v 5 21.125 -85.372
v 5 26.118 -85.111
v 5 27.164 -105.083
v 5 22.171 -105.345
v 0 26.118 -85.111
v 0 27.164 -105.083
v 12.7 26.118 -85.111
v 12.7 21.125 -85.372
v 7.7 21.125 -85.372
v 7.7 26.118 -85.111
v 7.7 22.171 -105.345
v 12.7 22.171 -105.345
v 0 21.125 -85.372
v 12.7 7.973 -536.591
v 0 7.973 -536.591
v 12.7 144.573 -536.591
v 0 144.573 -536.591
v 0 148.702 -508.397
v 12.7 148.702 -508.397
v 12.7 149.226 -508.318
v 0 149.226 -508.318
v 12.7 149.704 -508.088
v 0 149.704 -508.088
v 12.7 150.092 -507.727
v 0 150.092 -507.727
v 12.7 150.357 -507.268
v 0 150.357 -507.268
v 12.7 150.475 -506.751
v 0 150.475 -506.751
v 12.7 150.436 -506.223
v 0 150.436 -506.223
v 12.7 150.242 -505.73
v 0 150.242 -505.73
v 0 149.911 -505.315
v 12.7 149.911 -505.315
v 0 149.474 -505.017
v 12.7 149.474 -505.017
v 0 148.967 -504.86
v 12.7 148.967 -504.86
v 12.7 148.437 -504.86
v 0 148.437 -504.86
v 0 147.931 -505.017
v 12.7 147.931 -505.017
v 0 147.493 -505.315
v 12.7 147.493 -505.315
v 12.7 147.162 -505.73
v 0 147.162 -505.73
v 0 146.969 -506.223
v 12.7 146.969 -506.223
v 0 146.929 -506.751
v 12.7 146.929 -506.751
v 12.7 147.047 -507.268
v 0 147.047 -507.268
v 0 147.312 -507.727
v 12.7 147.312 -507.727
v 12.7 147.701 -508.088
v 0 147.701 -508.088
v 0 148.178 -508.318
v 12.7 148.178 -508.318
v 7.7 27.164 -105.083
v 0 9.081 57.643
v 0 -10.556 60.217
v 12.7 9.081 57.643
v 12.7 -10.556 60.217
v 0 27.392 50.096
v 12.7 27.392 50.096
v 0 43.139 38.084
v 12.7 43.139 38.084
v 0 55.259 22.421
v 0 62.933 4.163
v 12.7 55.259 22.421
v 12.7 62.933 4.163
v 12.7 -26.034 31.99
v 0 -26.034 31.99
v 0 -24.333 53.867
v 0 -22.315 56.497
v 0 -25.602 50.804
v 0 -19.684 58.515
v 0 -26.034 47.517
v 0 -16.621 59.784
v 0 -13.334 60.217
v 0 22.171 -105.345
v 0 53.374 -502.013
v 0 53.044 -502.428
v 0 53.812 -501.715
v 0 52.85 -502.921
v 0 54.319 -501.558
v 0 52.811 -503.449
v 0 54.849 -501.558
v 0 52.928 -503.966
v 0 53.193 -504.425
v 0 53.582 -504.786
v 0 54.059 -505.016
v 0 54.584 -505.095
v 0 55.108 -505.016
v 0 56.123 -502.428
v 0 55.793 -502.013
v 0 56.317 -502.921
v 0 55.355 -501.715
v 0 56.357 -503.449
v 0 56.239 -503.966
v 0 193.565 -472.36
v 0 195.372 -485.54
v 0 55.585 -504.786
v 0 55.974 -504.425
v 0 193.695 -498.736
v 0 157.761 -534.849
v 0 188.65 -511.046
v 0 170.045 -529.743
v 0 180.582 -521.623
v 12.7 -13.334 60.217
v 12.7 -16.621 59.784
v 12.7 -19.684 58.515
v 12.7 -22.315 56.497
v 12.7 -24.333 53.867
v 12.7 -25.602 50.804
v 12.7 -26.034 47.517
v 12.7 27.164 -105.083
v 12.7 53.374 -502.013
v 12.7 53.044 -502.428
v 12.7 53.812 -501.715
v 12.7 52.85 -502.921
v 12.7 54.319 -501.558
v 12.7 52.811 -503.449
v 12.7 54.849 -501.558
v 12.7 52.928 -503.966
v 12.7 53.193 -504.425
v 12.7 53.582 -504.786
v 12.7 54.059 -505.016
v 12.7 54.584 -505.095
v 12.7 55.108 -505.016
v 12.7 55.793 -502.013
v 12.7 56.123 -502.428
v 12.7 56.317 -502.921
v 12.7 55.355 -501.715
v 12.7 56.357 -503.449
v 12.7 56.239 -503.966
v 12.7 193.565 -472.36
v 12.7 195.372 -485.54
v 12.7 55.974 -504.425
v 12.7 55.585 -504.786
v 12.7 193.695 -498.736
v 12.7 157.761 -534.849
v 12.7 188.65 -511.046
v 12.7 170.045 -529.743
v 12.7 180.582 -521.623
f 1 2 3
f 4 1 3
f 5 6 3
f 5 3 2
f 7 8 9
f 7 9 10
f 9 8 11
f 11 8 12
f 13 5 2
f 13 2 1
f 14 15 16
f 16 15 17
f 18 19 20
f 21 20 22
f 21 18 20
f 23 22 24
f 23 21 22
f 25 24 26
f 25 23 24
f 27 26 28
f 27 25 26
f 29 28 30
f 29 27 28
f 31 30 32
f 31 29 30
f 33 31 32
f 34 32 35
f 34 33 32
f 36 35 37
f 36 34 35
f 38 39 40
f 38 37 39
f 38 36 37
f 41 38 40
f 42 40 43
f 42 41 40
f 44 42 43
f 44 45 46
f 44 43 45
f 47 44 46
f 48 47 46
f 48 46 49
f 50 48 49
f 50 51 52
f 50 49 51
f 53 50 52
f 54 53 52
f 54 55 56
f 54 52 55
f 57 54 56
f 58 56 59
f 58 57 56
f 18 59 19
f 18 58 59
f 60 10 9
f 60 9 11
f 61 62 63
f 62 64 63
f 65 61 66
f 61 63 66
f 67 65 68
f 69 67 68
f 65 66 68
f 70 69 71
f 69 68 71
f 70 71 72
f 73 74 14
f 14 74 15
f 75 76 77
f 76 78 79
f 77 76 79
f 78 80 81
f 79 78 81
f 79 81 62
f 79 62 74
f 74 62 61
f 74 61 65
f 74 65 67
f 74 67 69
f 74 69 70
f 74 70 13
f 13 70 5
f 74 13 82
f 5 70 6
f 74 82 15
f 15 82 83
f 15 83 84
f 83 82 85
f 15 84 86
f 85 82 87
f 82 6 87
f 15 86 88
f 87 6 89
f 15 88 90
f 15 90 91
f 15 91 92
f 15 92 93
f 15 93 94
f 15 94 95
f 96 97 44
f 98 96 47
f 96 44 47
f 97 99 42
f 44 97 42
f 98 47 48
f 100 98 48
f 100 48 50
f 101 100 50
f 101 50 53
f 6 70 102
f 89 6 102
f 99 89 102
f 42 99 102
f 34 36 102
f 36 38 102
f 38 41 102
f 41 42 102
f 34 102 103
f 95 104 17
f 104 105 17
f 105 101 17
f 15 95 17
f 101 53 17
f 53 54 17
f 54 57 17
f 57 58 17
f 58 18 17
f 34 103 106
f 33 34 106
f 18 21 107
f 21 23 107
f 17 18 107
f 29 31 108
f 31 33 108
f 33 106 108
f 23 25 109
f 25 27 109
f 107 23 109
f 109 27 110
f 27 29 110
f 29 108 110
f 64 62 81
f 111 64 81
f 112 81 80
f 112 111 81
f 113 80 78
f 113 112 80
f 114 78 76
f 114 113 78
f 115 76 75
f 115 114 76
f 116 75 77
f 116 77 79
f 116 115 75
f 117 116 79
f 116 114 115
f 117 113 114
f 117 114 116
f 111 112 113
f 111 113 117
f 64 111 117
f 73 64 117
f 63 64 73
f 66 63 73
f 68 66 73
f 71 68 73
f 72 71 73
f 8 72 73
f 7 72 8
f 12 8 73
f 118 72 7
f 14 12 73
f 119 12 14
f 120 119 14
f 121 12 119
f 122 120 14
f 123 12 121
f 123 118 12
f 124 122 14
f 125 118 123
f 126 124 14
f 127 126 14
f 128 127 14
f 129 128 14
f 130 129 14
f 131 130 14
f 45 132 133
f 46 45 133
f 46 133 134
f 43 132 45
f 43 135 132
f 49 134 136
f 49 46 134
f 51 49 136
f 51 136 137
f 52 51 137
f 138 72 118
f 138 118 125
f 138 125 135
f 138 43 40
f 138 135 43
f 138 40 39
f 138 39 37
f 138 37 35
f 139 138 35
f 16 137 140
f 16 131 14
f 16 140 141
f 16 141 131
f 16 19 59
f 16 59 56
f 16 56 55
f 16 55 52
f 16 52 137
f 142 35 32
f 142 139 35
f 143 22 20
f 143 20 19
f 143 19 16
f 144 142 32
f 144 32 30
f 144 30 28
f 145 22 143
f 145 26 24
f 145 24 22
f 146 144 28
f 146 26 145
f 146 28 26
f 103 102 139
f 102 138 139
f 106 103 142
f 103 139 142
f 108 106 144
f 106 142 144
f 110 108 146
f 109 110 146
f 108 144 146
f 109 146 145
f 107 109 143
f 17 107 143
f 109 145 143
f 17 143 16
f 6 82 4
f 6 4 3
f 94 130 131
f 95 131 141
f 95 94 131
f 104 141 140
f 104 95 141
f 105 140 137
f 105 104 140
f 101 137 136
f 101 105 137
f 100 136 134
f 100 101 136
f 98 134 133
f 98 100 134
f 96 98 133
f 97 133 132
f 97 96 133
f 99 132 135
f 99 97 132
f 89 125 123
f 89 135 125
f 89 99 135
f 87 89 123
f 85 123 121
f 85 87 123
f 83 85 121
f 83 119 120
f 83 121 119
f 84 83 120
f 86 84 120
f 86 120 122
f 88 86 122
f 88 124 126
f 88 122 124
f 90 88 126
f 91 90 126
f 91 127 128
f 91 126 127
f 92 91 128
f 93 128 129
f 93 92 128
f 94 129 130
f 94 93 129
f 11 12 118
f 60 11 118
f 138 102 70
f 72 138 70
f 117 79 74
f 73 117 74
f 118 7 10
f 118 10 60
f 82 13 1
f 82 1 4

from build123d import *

# Parameters (mm, degrees)
BOSS_EXTRUDE1_DEPTH = 12.7
FILLET1_R           = 76.2
FILLET2_R           = 50.8
FILLET3_R           = 12.7
SKETCH1_3_R         = 1.778
CUT_EXTRUDE1_DEPTH  = 32.004
SKETCH1_5_R         = 1.778
CUT_EXTRUDE3_DEPTH  = 19.304
SKETCH2_W           = 20
SKETCH2_H           = 5
CUT_EXTRUDE4_DEPTH  = 5
CUT_EXTRUDE5_DEPTH  = 5


with BuildPart() as part:
    # Sketch1 → Boss-Extrude1 (new body)
    with BuildSketch(Plane(origin=(0, 0, 0), x_dir=(0, 0, -1), z_dir=(1, 0, 0))):
        Polygon((-60.216908745, 47.566393508), (-60.216908745, -26.034482759), (-31.989836752, -26.034482759), (536.590579473, 7.973019947), (536.590579473, 211.173019947), align=None)
    extrude(amount=BOSS_EXTRUDE1_DEPTH)

    # Fillet1
    fillet1_edges = [part.edges().sort_by_distance(p)[0] for p in [
        (6.35, 47.566393508, 60.216908745),
    ]]
    fillet(fillet1_edges, radius=FILLET1_R)

    # Fillet2
    fillet2_edges = [part.edges().sort_by_distance(p)[0] for p in [
        (6.35, 211.173019947, -536.590579473),
    ]]
    fillet(fillet2_edges, radius=FILLET2_R)

    # Fillet3
    fillet3_edges = [part.edges().sort_by_distance(p)[0] for p in [
        (6.35, -26.034482759, 60.216908745),
    ]]
    fillet(fillet3_edges, radius=FILLET3_R)

    # Sketch1<3> → Cut-Extrude1 (cut)
    with BuildSketch(Plane(origin=(0, 0, 0), x_dir=(0, 0, -1), z_dir=(1, 0, 0))):
        with Locations((503.316579473, 54.583559733)):
            Circle(SKETCH1_3_R)
    extrude(amount=CUT_EXTRUDE1_DEPTH, mode=Mode.SUBTRACT)

    # Sketch1<5> → Cut-Extrude3 (cut)
    with BuildSketch(Plane(origin=(0, 0, 0), x_dir=(0, 0, -1), z_dir=(1, 0, 0))):
        with Locations((506.618579473, 148.702123969)):
            Circle(SKETCH1_5_R)
    extrude(amount=CUT_EXTRUDE3_DEPTH, mode=Mode.SUBTRACT)

    # Sketch2 → Cut-Extrude4 (cut)
    with BuildSketch(Plane(origin=(12.7, -3.610856195, -1.673147661), x_dir=(0, 0.05233595624294395, -0.9986295347545739), z_dir=(1, 0, 0))):
        with Locations((94.879123185, 22.820976731)):
            Rectangle(SKETCH2_W, SKETCH2_H)
    extrude(amount=-CUT_EXTRUDE4_DEPTH, mode=Mode.SUBTRACT)

    # Sketch3 → Cut-Extrude5 (cut)
    with BuildSketch(Plane.ZY):
        Polygon((-85.110749427, 26.117649094), (-85.372429208, 21.12450142), (-105.345019904, 22.171220545), (-105.083340122, 27.164368219), align=None)
    extrude(amount=-CUT_EXTRUDE5_DEPTH, mode=Mode.SUBTRACT)


solid = part.part
